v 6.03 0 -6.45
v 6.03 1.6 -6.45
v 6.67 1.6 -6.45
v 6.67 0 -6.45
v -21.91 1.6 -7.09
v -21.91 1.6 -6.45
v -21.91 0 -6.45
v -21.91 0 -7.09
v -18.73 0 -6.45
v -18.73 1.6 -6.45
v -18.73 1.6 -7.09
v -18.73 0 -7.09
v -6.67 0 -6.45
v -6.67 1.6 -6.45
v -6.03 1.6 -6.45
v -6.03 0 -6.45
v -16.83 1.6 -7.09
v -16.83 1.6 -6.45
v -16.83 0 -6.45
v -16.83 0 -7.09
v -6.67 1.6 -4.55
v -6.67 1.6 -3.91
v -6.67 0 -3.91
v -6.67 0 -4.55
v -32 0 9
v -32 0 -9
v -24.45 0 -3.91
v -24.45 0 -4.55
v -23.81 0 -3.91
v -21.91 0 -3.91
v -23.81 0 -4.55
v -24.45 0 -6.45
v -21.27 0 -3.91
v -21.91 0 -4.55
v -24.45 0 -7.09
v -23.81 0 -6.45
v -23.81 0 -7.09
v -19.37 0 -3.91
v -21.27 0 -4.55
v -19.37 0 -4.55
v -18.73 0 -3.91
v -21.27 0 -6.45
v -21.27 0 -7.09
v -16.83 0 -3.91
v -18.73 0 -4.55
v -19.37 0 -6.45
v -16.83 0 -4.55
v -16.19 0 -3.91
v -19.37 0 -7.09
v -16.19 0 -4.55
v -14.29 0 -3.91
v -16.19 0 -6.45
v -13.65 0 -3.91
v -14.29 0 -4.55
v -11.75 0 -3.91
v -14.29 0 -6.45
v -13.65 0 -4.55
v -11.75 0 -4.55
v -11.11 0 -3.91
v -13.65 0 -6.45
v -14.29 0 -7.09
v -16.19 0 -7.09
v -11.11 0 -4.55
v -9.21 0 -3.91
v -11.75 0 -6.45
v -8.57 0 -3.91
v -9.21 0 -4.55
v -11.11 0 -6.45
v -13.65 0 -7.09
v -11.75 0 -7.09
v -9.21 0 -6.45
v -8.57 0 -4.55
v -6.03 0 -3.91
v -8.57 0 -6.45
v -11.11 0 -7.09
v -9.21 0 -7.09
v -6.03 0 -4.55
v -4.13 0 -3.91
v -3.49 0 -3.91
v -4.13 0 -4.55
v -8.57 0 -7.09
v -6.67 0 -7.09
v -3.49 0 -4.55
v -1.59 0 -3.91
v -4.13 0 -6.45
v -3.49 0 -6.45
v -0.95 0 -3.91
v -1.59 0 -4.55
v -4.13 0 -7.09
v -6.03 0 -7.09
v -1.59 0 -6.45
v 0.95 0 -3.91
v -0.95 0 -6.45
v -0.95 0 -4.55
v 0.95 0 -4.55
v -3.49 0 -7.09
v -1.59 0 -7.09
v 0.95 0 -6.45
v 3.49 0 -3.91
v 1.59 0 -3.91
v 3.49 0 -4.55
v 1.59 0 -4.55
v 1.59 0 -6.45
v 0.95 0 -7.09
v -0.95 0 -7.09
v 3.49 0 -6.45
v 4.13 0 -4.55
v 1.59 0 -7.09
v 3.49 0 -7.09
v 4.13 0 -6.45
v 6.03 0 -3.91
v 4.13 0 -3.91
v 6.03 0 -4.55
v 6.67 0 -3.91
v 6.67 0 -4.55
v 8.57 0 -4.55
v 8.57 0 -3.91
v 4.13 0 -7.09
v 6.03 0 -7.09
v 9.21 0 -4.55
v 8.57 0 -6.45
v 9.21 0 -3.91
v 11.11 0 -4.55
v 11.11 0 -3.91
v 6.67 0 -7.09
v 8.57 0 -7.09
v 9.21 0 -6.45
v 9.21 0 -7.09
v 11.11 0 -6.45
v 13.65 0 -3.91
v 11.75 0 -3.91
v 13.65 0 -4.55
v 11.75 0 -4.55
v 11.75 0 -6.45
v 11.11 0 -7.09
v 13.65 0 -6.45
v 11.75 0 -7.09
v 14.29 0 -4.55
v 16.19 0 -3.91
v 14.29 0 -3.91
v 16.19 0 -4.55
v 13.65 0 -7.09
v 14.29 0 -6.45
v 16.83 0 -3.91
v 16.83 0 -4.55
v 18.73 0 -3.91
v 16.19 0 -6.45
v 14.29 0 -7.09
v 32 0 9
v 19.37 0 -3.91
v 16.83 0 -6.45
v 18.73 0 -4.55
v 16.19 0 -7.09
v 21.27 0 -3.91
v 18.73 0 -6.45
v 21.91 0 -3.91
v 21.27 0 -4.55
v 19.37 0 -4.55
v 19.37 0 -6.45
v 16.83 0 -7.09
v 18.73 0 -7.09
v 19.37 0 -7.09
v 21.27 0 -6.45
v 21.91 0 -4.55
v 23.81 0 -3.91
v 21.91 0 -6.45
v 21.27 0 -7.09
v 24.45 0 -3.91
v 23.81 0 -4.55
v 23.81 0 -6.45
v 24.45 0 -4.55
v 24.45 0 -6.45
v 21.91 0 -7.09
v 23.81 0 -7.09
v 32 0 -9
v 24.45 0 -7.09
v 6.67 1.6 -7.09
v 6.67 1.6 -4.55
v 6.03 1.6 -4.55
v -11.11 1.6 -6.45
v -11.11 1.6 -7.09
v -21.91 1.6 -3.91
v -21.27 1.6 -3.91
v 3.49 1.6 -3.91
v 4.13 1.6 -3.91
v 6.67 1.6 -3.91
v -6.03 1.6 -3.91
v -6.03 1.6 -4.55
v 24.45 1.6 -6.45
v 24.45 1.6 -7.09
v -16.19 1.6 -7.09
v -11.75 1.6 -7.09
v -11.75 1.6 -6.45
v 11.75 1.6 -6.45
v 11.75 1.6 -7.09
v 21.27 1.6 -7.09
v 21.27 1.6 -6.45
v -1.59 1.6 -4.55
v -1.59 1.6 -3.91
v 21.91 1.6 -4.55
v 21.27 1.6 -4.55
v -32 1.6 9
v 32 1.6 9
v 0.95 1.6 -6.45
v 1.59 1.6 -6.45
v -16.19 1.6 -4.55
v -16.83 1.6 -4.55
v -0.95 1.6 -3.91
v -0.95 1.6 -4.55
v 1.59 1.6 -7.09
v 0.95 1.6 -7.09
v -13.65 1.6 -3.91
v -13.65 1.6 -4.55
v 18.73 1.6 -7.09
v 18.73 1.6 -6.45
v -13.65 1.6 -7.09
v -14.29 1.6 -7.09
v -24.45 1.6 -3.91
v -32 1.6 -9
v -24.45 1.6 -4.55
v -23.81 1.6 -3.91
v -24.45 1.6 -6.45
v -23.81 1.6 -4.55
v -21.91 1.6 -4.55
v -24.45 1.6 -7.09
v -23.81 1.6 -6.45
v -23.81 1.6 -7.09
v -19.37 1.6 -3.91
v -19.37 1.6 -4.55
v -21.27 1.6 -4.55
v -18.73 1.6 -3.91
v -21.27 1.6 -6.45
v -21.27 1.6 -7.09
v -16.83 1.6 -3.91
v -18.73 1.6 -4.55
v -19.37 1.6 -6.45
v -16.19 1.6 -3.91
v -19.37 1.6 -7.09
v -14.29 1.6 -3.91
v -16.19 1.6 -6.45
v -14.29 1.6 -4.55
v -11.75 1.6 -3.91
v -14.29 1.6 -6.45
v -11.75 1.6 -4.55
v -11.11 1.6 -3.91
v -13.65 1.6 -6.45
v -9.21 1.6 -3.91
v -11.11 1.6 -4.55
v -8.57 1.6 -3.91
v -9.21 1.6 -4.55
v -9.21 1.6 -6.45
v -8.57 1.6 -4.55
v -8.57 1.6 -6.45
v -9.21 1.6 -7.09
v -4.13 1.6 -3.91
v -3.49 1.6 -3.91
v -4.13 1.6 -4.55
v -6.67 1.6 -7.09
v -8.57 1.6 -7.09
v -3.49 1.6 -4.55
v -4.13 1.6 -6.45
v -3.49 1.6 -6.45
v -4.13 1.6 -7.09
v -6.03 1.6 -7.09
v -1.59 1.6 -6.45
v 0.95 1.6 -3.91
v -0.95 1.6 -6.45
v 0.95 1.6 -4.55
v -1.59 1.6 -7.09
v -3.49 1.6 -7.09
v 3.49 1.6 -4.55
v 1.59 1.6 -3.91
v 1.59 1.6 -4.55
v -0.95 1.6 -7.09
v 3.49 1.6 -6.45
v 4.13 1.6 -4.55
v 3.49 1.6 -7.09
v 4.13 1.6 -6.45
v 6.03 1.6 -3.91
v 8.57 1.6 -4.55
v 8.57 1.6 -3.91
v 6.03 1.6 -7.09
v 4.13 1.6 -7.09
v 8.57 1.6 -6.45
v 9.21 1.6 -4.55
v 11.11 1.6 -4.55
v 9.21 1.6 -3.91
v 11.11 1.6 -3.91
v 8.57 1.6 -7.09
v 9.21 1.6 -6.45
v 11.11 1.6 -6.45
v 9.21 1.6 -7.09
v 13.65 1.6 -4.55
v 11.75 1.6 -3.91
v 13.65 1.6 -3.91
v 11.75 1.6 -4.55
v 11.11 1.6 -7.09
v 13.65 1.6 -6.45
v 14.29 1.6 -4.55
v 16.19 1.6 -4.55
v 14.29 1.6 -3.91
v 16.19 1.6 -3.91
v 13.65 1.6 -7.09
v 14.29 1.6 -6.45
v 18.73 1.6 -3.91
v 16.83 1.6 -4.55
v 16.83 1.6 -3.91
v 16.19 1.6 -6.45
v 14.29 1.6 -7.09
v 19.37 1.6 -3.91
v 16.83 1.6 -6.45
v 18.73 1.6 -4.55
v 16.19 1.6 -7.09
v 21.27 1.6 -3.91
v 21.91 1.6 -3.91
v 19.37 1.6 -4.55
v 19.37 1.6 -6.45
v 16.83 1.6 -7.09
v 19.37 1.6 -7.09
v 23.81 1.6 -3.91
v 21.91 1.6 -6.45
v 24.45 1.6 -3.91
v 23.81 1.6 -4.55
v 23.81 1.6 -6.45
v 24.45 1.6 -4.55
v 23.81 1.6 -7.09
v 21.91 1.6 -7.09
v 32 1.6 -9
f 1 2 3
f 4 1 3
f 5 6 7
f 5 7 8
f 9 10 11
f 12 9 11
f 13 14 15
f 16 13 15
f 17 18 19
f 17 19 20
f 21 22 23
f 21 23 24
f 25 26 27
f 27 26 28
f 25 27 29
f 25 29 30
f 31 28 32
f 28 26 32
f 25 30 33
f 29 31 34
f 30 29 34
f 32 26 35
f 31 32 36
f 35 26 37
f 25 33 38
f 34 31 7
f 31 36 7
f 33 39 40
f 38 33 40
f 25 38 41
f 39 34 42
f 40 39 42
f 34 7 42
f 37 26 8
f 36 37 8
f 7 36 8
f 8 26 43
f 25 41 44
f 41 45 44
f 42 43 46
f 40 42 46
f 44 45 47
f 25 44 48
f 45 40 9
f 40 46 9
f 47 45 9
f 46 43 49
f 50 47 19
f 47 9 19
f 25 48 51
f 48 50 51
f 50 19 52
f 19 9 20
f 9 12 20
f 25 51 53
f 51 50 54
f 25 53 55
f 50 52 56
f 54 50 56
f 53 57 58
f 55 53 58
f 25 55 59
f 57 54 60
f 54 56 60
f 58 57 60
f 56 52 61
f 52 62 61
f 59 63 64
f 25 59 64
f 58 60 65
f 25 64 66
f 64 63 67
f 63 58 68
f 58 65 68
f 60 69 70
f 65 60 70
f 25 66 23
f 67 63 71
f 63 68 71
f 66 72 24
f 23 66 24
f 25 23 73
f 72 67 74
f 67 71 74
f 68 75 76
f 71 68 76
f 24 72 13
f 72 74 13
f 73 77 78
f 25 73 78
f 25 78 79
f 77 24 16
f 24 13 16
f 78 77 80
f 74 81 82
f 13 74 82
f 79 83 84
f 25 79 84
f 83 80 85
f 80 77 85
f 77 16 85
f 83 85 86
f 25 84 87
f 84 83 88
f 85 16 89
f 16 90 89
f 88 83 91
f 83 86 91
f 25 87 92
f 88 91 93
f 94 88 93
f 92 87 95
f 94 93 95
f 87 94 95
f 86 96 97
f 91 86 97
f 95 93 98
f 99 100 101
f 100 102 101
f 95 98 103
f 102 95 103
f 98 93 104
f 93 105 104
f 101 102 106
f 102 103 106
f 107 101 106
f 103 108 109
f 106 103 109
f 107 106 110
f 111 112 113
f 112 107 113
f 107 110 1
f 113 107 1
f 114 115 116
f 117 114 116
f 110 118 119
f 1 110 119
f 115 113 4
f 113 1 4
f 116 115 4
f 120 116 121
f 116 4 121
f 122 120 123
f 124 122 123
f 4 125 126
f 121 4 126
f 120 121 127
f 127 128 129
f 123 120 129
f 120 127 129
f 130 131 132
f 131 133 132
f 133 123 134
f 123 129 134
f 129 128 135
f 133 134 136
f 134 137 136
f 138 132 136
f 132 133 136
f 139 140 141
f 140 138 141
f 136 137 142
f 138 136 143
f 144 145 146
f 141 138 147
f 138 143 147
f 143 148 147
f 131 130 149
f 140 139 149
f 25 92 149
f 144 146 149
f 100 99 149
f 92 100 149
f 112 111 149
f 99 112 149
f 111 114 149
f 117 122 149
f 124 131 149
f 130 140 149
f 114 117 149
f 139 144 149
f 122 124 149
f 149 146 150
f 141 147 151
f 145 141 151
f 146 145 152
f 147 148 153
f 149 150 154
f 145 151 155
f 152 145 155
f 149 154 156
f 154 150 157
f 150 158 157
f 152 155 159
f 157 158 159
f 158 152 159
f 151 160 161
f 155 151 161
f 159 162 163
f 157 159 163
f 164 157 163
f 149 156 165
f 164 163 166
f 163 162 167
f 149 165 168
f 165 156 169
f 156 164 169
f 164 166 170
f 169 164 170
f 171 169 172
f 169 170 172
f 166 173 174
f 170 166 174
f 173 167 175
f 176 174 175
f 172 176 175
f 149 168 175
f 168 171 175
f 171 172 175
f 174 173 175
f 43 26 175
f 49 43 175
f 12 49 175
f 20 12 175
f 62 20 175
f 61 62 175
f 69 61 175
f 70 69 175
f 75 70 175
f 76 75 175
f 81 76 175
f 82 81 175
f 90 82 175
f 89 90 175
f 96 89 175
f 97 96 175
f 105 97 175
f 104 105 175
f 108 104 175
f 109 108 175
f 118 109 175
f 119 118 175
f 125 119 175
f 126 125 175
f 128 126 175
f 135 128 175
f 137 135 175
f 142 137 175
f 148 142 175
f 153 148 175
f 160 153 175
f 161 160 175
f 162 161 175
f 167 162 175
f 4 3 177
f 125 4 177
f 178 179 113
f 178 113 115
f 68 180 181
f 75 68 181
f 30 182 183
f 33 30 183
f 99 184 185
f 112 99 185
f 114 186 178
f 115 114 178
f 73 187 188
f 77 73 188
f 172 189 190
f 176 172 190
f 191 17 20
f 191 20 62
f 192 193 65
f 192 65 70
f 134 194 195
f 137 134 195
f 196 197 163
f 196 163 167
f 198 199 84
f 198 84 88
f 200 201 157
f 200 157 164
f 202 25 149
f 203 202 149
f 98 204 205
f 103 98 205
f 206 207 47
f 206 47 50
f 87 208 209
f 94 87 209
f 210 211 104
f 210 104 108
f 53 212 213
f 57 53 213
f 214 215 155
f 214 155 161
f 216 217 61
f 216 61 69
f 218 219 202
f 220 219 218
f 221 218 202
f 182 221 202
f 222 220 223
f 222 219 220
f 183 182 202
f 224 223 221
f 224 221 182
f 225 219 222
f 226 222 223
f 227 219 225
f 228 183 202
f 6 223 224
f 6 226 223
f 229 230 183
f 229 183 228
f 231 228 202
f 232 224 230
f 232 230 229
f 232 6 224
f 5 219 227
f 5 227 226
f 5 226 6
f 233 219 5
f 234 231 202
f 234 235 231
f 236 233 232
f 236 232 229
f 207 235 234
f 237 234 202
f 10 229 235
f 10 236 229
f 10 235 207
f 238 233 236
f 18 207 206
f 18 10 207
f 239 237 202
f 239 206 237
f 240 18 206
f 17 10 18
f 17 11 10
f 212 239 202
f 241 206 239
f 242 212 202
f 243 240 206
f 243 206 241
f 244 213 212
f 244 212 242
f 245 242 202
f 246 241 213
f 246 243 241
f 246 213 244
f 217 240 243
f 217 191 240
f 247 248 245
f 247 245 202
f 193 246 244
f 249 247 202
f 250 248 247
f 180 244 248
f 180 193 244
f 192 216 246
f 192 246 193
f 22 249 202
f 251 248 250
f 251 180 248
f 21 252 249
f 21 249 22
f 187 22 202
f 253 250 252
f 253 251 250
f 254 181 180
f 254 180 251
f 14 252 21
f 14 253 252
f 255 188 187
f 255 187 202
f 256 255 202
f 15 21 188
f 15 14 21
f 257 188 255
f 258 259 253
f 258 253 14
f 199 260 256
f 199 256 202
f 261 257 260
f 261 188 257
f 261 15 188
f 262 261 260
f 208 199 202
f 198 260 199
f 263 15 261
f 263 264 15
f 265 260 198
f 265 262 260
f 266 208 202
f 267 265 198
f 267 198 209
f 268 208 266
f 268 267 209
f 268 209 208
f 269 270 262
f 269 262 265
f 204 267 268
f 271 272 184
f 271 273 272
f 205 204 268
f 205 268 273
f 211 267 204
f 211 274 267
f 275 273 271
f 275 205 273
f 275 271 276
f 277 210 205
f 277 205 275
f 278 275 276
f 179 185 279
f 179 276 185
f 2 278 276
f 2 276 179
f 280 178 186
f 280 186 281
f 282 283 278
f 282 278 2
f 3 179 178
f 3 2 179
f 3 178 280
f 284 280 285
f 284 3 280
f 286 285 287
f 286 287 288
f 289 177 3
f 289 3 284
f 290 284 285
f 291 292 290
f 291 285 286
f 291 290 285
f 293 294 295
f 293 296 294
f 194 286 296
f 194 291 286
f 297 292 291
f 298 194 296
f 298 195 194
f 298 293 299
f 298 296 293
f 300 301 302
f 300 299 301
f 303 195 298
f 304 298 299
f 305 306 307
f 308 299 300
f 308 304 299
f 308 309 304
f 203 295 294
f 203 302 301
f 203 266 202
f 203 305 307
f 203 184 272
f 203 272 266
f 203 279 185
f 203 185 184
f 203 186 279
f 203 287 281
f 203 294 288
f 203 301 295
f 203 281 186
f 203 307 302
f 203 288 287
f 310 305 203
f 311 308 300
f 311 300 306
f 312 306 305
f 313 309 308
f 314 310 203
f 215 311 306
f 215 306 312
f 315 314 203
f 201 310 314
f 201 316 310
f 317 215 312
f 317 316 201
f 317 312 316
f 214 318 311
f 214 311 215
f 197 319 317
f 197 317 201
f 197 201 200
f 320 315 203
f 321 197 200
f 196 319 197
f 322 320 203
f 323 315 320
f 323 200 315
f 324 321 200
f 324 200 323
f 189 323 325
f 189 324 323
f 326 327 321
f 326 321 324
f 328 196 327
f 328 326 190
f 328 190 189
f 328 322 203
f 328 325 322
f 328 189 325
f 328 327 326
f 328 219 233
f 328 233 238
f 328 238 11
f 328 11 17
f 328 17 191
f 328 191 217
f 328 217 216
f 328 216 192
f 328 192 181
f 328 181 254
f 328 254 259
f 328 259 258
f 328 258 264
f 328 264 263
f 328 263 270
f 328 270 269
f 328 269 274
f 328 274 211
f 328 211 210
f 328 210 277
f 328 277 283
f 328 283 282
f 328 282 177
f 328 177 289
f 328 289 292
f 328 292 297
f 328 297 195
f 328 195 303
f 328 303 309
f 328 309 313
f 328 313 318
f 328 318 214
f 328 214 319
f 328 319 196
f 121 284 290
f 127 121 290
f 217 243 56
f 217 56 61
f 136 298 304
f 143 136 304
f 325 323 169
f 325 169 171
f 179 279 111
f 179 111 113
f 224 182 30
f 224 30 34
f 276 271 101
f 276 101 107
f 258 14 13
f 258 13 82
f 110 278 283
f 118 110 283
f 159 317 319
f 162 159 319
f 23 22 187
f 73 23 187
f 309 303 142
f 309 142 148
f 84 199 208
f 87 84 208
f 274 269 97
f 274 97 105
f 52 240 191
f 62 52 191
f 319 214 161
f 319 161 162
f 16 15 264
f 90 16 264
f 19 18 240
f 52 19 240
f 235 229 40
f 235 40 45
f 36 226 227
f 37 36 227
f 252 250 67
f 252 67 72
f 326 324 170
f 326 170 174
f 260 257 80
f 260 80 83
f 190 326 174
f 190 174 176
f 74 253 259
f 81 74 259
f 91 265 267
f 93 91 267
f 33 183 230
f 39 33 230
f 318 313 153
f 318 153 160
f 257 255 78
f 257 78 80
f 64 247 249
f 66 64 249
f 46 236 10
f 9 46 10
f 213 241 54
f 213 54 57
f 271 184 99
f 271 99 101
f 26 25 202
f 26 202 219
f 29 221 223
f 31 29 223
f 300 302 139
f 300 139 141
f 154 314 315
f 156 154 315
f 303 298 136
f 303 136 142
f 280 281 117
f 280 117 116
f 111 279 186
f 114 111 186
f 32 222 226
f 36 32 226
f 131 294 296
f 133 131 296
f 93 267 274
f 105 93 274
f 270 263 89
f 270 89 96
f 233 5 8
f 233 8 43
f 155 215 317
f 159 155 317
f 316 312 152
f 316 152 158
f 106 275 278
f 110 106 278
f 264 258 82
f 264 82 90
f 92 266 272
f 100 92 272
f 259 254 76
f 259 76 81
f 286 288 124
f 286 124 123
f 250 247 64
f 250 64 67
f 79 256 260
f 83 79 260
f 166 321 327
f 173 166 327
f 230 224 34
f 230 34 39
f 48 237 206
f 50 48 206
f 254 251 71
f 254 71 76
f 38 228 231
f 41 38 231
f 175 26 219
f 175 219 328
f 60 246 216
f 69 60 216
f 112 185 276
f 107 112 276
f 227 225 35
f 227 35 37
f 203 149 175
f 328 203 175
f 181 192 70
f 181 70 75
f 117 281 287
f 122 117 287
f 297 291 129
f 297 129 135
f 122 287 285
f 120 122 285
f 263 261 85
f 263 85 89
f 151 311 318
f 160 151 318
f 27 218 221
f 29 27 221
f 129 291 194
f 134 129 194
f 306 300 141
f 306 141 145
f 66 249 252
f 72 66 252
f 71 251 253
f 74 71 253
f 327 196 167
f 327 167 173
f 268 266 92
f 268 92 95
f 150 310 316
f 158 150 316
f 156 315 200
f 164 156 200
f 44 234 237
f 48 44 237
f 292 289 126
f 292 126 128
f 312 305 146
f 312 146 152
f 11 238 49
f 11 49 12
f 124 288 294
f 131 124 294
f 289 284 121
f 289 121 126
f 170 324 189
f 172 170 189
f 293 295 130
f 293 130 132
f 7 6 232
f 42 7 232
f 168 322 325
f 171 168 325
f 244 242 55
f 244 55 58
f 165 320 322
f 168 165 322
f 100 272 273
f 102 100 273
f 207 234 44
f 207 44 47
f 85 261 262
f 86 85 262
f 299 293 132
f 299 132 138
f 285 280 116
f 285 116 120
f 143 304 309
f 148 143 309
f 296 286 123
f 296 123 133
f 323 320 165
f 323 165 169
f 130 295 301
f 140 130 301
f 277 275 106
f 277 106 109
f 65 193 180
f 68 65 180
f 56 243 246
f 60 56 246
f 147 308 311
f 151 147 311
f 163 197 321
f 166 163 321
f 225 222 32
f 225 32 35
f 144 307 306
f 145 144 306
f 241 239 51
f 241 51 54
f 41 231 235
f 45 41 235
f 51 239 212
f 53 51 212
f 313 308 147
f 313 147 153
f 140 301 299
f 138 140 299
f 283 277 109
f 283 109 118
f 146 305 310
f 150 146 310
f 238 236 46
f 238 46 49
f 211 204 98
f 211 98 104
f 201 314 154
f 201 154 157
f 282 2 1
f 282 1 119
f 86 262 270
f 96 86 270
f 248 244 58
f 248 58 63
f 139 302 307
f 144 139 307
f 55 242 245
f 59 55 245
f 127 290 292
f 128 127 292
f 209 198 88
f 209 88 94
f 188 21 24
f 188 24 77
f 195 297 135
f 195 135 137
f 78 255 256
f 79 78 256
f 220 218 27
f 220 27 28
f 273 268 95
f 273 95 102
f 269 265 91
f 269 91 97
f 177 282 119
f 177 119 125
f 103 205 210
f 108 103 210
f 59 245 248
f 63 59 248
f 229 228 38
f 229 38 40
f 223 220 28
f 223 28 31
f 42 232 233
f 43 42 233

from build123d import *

# Parameters (mm, degrees)
SKETCH1_W           = 64
SKETCH1_H           = 18
BOSS_EXTRUDE1_DEPTH = 1.6
SKETCH2_W           = 0.64
SKETCH2_H           = 0.64
CUT_EXTRUDE2_DEPTH  = 34.280024038


with BuildPart() as part:
    # Sketch1 → Boss-Extrude1 (new body)
    with BuildSketch(Plane(origin=(0, 0, 0), x_dir=(1, 0, 0), z_dir=(0, 1, 0))):
        Rectangle(SKETCH1_W, SKETCH1_H)
    extrude(amount=BOSS_EXTRUDE1_DEPTH)

    # Sketch2 → Cut-Extrude2 (cut, through all)
    with BuildSketch(Plane(origin=(0, 1.6, 0), x_dir=(1, 0, 0), z_dir=(0, 1, 0))):
        with Locations((-21.59, 6.77)):
            Rectangle(SKETCH2_W, SKETCH2_H)
        with Locations((-24.13, 6.77)):
            Rectangle(SKETCH2_W, SKETCH2_H)
        with Locations((-24.13, 4.23)):
            Rectangle(SKETCH2_W, SKETCH2_H)
        with Locations((-21.59, 4.23)):
            Rectangle(SKETCH2_W, SKETCH2_H)
        with Locations((-19.05, 6.77)):
            Rectangle(SKETCH2_W, SKETCH2_H)
        with Locations((-19.05, 4.23)):
            Rectangle(SKETCH2_W, SKETCH2_H)
        with Locations((-16.51, 4.23)):
            Rectangle(SKETCH2_W, SKETCH2_H)
        with Locations((-16.51, 6.77)):
            Rectangle(SKETCH2_W, SKETCH2_H)
        with Locations((-13.97, 6.77)):
            Rectangle(SKETCH2_W, SKETCH2_H)
        with Locations((-13.97, 4.23)):
            Rectangle(SKETCH2_W, SKETCH2_H)
        with Locations((-11.43, 6.77)):
            Rectangle(SKETCH2_W, SKETCH2_H)
        with Locations((-11.43, 4.23)):
            Rectangle(SKETCH2_W, SKETCH2_H)
        with Locations((-8.89, 6.77)):
            Rectangle(SKETCH2_W, SKETCH2_H)
        with Locations((-8.89, 4.23)):
            Rectangle(SKETCH2_W, SKETCH2_H)
        with Locations((-6.35, 4.23)):
            Rectangle(SKETCH2_W, SKETCH2_H)
        with Locations((-6.35, 6.77)):
            Rectangle(SKETCH2_W, SKETCH2_H)
        with Locations((-3.81, 6.77)):
            Rectangle(SKETCH2_W, SKETCH2_H)
        with Locations((-3.81, 4.23)):
            Rectangle(SKETCH2_W, SKETCH2_H)
        with Locations((-1.27, 4.23)):
            Rectangle(SKETCH2_W, SKETCH2_H)
        with Locations((1.27, 4.23)):
            Rectangle(SKETCH2_W, SKETCH2_H)
        with Locations((-1.27, 6.77)):
            Rectangle(SKETCH2_W, SKETCH2_H)
        with Locations((1.27, 6.77)):
            Rectangle(SKETCH2_W, SKETCH2_H)
        with Locations((3.81, 6.77)):
            Rectangle(SKETCH2_W, SKETCH2_H)
        with Locations((3.81, 4.23)):
            Rectangle(SKETCH2_W, SKETCH2_H)
        with Locations((6.35, 4.23)):
            Rectangle(SKETCH2_W, SKETCH2_H)
        with Locations((8.89, 4.23)):
            Rectangle(SKETCH2_W, SKETCH2_H)
        with Locations((6.35, 6.77)):
            Rectangle(SKETCH2_W, SKETCH2_H)
        with Locations((8.89, 6.77)):
            Rectangle(SKETCH2_W, SKETCH2_H)
        with Locations((11.43, 6.77)):
            Rectangle(SKETCH2_W, SKETCH2_H)
        with Locations((11.43, 4.23)):
            Rectangle(SKETCH2_W, SKETCH2_H)
        with Locations((13.97, 6.77)):
            Rectangle(SKETCH2_W, SKETCH2_H)
        with Locations((13.97, 4.23)):
            Rectangle(SKETCH2_W, SKETCH2_H)
        with Locations((16.51, 6.77)):
            Rectangle(SKETCH2_W, SKETCH2_H)
        with Locations((16.51, 4.23)):
            Rectangle(SKETCH2_W, SKETCH2_H)
        with Locations((19.05, 6.77)):
            Rectangle(SKETCH2_W, SKETCH2_H)
        with Locations((19.05, 4.23)):
            Rectangle(SKETCH2_W, SKETCH2_H)
        with Locations((21.59, 6.77)):
            Rectangle(SKETCH2_W, SKETCH2_H)
        with Locations((21.59, 4.23)):
            Rectangle(SKETCH2_W, SKETCH2_H)
        with Locations((24.13, 4.23)):
            Rectangle(SKETCH2_W, SKETCH2_H)
        with Locations((24.13, 6.77)):
            Rectangle(SKETCH2_W, SKETCH2_H)
    extrude(amount=-CUT_EXTRUDE2_DEPTH, mode=Mode.SUBTRACT)


solid = part.part
